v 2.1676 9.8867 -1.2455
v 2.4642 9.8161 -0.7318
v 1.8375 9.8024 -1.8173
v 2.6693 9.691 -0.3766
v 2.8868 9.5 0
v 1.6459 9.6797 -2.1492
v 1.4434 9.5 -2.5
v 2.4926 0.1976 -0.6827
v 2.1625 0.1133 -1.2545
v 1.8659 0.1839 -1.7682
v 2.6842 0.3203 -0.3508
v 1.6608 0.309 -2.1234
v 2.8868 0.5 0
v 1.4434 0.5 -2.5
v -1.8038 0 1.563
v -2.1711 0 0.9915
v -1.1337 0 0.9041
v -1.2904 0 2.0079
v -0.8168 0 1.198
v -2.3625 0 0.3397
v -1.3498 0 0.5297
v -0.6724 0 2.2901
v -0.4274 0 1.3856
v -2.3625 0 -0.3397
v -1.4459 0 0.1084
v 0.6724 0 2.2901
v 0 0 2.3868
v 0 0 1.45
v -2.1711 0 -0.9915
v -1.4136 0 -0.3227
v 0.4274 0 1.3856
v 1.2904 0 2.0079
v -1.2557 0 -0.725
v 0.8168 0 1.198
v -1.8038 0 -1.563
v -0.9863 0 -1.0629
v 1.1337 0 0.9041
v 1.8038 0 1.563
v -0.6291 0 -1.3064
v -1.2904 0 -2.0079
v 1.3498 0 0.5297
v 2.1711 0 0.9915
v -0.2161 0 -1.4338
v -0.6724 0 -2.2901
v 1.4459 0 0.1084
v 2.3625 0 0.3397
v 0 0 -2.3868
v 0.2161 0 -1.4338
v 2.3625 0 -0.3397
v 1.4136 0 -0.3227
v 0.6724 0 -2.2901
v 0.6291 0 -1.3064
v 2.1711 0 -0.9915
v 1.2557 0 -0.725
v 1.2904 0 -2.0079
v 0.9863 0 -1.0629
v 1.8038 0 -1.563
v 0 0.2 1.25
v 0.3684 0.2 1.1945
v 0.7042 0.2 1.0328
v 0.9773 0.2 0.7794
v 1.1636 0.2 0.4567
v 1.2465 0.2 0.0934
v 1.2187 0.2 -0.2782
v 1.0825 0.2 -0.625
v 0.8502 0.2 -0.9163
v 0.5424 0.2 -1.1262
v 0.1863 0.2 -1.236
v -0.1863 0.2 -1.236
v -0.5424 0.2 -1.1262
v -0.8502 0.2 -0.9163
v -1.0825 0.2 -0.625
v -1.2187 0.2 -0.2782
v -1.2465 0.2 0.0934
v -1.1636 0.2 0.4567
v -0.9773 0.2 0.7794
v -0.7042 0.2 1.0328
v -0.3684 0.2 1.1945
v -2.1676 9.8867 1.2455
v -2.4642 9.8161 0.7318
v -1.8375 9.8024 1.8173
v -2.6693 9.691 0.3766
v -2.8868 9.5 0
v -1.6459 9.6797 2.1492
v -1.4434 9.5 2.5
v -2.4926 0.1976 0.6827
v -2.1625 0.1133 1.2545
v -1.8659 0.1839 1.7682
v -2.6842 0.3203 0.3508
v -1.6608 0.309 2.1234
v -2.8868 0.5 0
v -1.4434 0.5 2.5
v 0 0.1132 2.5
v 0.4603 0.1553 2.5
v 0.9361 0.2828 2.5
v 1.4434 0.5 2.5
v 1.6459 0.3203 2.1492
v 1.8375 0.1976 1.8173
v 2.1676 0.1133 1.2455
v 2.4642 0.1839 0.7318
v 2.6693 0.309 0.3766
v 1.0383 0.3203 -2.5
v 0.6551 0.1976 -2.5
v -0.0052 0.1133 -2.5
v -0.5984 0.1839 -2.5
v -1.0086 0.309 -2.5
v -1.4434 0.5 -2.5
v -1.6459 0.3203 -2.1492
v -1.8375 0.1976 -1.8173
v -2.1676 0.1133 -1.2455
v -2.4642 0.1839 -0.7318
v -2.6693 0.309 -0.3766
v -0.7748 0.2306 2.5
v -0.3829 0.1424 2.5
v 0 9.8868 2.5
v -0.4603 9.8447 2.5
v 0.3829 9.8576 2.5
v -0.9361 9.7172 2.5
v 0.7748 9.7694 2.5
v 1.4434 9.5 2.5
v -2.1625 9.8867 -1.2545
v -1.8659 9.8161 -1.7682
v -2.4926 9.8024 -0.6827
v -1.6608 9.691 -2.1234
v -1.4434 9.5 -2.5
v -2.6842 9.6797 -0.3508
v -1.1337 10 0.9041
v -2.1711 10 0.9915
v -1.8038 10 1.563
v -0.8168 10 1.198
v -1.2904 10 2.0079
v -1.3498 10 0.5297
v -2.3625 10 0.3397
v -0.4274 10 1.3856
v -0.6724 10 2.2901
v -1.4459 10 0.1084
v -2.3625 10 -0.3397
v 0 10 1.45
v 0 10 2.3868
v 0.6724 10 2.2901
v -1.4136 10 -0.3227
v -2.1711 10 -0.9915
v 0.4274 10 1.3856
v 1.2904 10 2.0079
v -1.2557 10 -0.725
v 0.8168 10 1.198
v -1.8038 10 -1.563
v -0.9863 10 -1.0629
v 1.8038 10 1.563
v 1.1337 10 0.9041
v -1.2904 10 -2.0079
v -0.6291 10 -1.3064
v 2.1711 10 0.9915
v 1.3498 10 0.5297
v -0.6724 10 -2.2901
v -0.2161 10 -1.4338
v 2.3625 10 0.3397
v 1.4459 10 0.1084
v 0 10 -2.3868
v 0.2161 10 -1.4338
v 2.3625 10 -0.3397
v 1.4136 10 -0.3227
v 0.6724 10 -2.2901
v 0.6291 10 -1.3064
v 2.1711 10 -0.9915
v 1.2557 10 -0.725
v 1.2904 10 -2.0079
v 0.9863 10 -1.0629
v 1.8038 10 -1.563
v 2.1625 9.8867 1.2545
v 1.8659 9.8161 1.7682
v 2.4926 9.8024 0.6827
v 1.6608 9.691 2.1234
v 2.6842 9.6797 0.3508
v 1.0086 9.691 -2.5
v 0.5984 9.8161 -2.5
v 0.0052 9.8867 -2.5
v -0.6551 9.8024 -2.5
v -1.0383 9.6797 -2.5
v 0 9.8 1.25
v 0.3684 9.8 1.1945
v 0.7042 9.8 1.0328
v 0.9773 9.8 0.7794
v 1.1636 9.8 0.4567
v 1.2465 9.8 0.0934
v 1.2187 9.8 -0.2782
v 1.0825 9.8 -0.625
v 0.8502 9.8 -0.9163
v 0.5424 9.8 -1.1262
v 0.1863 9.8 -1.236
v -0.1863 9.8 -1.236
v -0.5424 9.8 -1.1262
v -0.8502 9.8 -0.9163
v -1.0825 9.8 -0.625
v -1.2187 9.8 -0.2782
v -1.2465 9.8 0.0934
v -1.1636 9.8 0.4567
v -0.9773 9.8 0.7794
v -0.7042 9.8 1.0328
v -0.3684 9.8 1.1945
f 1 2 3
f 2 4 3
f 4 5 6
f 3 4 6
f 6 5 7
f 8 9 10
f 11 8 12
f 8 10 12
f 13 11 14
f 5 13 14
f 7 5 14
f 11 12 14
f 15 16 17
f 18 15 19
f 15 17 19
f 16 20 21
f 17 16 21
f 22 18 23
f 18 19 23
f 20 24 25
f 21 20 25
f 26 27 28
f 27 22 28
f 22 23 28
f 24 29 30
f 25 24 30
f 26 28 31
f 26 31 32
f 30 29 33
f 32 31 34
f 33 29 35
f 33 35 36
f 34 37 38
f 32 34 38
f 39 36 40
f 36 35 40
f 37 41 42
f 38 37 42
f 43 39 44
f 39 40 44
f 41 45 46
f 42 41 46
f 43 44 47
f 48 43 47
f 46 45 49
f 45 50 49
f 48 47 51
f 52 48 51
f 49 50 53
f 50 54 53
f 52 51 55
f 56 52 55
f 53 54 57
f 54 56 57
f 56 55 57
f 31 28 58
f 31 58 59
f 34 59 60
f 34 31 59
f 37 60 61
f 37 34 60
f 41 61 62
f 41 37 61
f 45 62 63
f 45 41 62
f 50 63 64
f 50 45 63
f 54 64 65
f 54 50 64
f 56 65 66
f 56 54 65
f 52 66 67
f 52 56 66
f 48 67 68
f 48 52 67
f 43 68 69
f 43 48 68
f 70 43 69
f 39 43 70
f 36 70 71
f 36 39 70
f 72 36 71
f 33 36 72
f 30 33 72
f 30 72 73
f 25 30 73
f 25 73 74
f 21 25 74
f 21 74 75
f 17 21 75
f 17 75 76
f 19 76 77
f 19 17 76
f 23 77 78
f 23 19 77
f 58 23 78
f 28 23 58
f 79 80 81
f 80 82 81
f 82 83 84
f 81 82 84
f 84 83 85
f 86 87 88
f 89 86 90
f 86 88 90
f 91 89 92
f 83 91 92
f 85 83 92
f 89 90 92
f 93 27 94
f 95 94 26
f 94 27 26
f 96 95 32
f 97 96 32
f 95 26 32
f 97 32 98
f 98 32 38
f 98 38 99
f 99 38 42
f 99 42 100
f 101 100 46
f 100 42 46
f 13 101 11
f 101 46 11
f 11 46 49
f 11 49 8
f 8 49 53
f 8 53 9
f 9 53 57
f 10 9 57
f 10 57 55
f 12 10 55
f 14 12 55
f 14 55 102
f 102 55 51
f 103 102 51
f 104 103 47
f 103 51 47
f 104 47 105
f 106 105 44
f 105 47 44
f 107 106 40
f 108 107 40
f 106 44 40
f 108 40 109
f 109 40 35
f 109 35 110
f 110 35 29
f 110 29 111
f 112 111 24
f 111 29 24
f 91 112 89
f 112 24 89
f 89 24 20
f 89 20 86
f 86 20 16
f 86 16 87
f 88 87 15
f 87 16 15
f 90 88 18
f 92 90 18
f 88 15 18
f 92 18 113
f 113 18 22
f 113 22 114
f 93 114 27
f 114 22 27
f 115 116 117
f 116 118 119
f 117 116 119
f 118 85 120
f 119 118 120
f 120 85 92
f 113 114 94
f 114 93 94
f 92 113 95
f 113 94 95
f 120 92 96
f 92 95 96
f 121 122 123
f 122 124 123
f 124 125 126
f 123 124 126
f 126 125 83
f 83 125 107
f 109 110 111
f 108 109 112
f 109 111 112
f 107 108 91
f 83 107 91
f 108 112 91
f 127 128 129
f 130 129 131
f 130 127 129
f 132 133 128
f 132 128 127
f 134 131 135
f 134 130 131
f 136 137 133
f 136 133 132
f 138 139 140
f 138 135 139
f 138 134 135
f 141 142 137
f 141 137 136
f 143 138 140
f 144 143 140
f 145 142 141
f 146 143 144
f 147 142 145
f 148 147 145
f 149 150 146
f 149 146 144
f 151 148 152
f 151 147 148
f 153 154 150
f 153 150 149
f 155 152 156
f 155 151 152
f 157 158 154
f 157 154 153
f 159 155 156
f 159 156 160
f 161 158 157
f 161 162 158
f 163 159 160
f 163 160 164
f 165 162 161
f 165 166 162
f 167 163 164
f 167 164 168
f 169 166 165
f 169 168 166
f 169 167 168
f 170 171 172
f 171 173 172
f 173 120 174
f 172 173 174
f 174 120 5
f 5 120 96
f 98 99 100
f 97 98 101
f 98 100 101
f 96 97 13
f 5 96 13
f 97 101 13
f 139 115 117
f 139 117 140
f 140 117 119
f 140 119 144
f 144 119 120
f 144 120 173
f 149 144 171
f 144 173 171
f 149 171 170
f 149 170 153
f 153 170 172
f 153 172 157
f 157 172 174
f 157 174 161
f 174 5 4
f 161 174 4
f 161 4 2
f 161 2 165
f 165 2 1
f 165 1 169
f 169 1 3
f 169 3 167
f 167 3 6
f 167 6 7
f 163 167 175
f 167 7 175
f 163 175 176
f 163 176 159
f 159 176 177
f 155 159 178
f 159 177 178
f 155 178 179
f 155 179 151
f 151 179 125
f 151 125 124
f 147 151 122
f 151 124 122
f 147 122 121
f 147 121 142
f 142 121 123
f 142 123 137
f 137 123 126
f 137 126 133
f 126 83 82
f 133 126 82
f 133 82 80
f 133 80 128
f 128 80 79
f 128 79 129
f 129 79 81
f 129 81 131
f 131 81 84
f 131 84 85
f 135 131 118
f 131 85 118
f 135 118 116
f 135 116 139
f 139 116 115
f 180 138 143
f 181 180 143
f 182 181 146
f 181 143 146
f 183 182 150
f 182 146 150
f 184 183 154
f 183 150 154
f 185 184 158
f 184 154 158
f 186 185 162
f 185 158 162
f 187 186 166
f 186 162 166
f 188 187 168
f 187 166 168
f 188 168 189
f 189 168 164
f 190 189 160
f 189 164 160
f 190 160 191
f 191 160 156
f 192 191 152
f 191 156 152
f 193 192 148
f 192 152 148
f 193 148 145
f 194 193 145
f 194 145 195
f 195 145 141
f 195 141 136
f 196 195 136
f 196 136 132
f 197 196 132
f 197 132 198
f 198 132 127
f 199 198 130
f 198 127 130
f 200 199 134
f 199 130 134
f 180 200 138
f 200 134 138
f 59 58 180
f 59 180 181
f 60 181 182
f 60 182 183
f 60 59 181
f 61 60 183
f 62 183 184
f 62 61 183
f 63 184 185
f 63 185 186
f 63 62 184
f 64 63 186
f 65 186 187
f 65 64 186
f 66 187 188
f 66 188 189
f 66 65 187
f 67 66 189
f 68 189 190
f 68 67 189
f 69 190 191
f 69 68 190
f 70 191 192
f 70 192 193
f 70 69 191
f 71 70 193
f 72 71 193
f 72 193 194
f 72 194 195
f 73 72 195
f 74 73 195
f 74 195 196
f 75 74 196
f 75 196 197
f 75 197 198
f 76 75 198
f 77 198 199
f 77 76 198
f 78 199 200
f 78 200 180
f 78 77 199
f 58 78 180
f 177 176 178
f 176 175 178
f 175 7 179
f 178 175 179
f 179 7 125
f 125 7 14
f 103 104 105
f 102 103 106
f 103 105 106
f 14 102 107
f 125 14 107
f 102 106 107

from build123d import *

# Parameters (mm, degrees)
SKETCH1_R           = 1.25
BOSS_EXTRUDE1_DEPTH = 10
CHAMFER1_SIZE       = 0.2


with BuildPart() as part:
    # Sketch1 → Boss-Extrude1 (new body)
    with BuildSketch(Plane(origin=(0, 0, 0), x_dir=(1, 0, 0), z_dir=(0, 1, 0))):
        Polygon((1.443375673, 2.5), (-1.443375673, 2.5), (-2.886751346, 0), (-1.443375673, -2.5), (1.443375673, -2.5), (2.886751346, 0), align=None)
        with Locations(Location((0, 0, 0), (0, 0, 270))):  # turned: the seam where the file's is
            Circle(SKETCH1_R, mode=Mode.SUBTRACT)
    extrude(amount=BOSS_EXTRUDE1_DEPTH)

    # Chamfer1
    chamfer1_edges = [part.edges().sort_by_distance(p)[0] for p in [
        (0, 0, -1.25),
        (0, 10, -1.25),
    ]]
    chamfer(chamfer1_edges, length=CHAMFER1_SIZE)

    # Sketch2 → Cut-Revolve1 (revolve, cut)
    with BuildSketch(Plane.XY, mode=Mode.PRIVATE) as cut_revolve1_sk:
        Polygon((2.386751346, 10), (2.886751346, 9.5), (2.886751346, 10), align=None)
        Polygon((2.386751346, 0), (2.886751346, 0), (2.886751346, 0.5), align=None)
    revolve(cut_revolve1_sk.sketch.rotate(Axis((0, 0, 0), (0, 1, 0)), 270), axis=Axis((0, 0, 0), (0, 1, 0)), mode=Mode.SUBTRACT)  # turned: the seam where the file's is


solid = part.part
